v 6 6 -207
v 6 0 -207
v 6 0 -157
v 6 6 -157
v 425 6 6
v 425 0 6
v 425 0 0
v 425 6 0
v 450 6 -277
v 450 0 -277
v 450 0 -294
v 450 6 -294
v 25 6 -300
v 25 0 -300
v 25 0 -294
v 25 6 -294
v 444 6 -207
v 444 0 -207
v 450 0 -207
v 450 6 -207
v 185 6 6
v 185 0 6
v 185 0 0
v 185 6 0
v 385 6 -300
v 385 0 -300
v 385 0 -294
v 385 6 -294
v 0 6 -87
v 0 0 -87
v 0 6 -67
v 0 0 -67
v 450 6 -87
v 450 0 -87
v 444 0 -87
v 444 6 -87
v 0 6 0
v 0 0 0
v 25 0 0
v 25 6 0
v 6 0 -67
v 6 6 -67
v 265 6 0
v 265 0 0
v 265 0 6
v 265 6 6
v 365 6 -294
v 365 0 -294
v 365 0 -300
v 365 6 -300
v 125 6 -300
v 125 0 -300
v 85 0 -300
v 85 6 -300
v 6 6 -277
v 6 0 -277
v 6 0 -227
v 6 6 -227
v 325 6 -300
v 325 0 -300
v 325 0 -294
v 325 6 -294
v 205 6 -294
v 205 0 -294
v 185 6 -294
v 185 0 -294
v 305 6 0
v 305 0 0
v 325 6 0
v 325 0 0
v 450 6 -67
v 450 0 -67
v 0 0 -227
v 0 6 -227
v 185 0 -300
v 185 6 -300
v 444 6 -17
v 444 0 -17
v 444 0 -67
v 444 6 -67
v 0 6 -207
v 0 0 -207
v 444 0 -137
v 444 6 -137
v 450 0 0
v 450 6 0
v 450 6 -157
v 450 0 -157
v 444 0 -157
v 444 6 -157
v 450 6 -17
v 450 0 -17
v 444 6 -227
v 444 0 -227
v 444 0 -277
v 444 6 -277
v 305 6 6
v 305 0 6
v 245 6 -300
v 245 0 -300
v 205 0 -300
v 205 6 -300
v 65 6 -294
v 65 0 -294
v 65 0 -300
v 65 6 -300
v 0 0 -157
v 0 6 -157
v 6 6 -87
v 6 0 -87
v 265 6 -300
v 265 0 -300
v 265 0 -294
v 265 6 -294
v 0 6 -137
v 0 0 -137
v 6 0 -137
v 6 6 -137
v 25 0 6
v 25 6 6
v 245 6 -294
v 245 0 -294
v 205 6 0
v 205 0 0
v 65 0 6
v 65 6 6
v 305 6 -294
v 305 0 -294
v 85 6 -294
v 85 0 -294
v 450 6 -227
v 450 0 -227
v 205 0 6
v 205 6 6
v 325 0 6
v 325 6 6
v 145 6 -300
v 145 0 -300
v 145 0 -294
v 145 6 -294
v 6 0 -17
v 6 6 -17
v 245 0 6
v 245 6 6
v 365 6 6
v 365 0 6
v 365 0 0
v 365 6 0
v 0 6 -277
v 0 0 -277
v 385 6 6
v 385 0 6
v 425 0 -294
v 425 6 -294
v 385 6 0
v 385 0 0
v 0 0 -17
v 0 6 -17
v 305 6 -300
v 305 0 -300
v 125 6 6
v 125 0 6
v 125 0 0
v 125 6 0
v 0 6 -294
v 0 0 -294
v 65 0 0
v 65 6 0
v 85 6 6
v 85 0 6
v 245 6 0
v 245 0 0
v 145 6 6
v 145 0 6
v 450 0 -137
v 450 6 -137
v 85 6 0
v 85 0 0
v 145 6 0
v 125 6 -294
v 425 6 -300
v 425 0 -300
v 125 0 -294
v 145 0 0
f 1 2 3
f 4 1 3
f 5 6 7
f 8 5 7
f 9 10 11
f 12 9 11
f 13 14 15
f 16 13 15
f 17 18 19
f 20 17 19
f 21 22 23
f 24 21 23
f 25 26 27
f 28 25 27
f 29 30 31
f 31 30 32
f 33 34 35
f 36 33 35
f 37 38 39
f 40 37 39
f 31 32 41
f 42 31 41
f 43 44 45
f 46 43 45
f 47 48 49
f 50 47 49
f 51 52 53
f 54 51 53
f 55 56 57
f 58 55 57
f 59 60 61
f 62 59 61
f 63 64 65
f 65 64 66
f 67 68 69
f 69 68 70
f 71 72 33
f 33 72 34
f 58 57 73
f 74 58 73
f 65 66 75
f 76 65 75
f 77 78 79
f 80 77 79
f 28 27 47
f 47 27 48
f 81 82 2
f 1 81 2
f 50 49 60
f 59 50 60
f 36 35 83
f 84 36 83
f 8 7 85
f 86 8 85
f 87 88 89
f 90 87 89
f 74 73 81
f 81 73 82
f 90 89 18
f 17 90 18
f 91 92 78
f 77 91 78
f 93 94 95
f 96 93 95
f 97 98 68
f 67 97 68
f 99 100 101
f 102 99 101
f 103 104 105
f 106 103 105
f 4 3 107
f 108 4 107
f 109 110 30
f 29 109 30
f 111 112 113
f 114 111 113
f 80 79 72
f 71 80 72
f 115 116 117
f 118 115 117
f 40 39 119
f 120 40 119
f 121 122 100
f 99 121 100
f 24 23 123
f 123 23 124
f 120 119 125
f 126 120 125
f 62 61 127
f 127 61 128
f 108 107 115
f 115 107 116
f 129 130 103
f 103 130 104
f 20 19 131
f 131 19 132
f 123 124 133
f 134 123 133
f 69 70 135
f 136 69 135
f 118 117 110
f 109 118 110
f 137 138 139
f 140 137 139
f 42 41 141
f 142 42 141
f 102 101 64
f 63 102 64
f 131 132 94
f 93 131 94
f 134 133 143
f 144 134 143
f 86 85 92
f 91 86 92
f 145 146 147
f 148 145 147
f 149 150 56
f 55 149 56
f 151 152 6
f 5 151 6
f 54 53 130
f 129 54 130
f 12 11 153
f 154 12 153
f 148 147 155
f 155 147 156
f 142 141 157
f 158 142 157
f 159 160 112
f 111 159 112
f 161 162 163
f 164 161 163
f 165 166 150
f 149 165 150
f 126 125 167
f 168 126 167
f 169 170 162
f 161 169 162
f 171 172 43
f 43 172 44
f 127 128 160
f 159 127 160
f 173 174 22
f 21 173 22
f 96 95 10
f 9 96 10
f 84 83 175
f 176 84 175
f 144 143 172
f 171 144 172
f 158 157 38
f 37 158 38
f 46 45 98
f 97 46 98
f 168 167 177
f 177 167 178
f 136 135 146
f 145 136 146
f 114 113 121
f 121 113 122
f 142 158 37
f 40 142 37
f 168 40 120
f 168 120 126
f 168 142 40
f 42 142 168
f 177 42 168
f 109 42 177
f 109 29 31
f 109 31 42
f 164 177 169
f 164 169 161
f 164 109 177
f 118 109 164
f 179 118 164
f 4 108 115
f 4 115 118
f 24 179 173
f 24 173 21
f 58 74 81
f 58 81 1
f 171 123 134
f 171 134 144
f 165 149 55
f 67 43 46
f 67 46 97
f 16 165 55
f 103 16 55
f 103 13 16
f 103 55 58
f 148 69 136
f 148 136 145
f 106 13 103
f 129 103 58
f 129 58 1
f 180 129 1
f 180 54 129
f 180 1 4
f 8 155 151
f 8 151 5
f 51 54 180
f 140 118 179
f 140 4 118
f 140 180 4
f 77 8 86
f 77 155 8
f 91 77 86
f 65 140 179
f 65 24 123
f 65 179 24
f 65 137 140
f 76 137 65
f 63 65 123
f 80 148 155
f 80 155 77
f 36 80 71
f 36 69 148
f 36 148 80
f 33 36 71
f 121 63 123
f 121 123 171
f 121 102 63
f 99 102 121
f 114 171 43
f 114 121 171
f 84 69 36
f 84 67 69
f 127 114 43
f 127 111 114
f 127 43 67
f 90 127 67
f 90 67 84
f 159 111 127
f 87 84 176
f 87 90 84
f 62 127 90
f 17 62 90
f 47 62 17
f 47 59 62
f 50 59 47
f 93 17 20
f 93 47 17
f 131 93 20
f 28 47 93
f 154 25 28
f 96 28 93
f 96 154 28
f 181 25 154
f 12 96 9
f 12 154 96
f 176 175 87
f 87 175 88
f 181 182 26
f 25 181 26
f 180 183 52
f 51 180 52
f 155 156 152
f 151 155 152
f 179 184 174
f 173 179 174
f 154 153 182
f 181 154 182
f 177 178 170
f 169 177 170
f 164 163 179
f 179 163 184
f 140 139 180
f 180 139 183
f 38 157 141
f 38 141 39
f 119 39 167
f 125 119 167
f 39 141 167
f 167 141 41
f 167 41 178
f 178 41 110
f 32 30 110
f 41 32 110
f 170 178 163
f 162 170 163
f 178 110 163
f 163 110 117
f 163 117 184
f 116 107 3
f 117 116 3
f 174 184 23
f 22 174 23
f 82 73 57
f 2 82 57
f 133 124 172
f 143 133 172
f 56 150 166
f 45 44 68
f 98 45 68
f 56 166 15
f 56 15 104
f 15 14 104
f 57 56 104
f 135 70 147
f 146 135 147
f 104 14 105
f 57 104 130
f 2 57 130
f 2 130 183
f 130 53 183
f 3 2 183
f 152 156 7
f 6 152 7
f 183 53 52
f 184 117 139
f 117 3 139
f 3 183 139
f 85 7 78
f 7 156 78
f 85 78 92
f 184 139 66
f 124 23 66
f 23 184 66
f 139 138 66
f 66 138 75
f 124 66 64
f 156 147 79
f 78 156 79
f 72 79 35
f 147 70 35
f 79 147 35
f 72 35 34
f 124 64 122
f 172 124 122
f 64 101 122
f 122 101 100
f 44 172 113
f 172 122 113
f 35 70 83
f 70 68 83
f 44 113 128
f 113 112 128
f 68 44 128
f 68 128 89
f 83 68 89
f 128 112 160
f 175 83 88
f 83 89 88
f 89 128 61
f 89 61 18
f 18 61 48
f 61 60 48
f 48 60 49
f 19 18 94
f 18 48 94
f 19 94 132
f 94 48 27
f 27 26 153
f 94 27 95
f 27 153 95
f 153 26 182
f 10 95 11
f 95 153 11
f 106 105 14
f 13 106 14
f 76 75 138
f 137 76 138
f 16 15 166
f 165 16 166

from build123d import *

# Parameters (mm, degrees)
BOSS_EXTRU_1_DEPTH = 6


with BuildPart() as part:
    # Esquisse1 → Boss.-Extru.1 (new body)
    with BuildSketch(Plane(origin=(0, 0, 0), x_dir=(1, 0, 0), z_dir=(0, 1, 0))):
        Polygon((0, 0), (25, 0), (25, -6), (65, -6), (65, 0), (85, 0), (85, -6), (125, -6), (125, 0), (145, 0), (145, -6), (185, -6), (185, 0), (205, 0), (205, -6), (245, -6), (245, 0), (265, 0), (265, -6), (305, -6), (305, 0), (325, 0), (325, -6), (365, -6), (365, 0), (385, 0), (385, -6), (425, -6), (425, 0), (450, 0), (450, 17), (444, 17), (444, 67), (450, 67), (450, 87), (444, 87), (444, 137), (450, 137), (450, 157), (444, 157), (444, 207), (450, 207), (450, 227), (444, 227), (444, 277), (450, 277), (450, 294), (425, 294), (425, 300), (385, 300), (385, 294), (365, 294), (365, 300), (325, 300), (325, 294), (305, 294), (305, 300), (265, 300), (265, 294), (245, 294), (245, 300), (205, 300), (205, 294), (185, 294), (185, 300), (145, 300), (145, 294), (125, 294), (125, 300), (85, 300), (85, 294), (65, 294), (65, 300), (25, 300), (25, 294), (0, 294), (0, 277), (6, 277), (6, 227), (0, 227), (0, 207), (6, 207), (6, 157), (0, 157), (0, 137), (6, 137), (6, 87), (0, 87), (0, 67), (6, 67), (6, 17), (0, 17), align=None)
    extrude(amount=BOSS_EXTRU_1_DEPTH)


solid = part.part
